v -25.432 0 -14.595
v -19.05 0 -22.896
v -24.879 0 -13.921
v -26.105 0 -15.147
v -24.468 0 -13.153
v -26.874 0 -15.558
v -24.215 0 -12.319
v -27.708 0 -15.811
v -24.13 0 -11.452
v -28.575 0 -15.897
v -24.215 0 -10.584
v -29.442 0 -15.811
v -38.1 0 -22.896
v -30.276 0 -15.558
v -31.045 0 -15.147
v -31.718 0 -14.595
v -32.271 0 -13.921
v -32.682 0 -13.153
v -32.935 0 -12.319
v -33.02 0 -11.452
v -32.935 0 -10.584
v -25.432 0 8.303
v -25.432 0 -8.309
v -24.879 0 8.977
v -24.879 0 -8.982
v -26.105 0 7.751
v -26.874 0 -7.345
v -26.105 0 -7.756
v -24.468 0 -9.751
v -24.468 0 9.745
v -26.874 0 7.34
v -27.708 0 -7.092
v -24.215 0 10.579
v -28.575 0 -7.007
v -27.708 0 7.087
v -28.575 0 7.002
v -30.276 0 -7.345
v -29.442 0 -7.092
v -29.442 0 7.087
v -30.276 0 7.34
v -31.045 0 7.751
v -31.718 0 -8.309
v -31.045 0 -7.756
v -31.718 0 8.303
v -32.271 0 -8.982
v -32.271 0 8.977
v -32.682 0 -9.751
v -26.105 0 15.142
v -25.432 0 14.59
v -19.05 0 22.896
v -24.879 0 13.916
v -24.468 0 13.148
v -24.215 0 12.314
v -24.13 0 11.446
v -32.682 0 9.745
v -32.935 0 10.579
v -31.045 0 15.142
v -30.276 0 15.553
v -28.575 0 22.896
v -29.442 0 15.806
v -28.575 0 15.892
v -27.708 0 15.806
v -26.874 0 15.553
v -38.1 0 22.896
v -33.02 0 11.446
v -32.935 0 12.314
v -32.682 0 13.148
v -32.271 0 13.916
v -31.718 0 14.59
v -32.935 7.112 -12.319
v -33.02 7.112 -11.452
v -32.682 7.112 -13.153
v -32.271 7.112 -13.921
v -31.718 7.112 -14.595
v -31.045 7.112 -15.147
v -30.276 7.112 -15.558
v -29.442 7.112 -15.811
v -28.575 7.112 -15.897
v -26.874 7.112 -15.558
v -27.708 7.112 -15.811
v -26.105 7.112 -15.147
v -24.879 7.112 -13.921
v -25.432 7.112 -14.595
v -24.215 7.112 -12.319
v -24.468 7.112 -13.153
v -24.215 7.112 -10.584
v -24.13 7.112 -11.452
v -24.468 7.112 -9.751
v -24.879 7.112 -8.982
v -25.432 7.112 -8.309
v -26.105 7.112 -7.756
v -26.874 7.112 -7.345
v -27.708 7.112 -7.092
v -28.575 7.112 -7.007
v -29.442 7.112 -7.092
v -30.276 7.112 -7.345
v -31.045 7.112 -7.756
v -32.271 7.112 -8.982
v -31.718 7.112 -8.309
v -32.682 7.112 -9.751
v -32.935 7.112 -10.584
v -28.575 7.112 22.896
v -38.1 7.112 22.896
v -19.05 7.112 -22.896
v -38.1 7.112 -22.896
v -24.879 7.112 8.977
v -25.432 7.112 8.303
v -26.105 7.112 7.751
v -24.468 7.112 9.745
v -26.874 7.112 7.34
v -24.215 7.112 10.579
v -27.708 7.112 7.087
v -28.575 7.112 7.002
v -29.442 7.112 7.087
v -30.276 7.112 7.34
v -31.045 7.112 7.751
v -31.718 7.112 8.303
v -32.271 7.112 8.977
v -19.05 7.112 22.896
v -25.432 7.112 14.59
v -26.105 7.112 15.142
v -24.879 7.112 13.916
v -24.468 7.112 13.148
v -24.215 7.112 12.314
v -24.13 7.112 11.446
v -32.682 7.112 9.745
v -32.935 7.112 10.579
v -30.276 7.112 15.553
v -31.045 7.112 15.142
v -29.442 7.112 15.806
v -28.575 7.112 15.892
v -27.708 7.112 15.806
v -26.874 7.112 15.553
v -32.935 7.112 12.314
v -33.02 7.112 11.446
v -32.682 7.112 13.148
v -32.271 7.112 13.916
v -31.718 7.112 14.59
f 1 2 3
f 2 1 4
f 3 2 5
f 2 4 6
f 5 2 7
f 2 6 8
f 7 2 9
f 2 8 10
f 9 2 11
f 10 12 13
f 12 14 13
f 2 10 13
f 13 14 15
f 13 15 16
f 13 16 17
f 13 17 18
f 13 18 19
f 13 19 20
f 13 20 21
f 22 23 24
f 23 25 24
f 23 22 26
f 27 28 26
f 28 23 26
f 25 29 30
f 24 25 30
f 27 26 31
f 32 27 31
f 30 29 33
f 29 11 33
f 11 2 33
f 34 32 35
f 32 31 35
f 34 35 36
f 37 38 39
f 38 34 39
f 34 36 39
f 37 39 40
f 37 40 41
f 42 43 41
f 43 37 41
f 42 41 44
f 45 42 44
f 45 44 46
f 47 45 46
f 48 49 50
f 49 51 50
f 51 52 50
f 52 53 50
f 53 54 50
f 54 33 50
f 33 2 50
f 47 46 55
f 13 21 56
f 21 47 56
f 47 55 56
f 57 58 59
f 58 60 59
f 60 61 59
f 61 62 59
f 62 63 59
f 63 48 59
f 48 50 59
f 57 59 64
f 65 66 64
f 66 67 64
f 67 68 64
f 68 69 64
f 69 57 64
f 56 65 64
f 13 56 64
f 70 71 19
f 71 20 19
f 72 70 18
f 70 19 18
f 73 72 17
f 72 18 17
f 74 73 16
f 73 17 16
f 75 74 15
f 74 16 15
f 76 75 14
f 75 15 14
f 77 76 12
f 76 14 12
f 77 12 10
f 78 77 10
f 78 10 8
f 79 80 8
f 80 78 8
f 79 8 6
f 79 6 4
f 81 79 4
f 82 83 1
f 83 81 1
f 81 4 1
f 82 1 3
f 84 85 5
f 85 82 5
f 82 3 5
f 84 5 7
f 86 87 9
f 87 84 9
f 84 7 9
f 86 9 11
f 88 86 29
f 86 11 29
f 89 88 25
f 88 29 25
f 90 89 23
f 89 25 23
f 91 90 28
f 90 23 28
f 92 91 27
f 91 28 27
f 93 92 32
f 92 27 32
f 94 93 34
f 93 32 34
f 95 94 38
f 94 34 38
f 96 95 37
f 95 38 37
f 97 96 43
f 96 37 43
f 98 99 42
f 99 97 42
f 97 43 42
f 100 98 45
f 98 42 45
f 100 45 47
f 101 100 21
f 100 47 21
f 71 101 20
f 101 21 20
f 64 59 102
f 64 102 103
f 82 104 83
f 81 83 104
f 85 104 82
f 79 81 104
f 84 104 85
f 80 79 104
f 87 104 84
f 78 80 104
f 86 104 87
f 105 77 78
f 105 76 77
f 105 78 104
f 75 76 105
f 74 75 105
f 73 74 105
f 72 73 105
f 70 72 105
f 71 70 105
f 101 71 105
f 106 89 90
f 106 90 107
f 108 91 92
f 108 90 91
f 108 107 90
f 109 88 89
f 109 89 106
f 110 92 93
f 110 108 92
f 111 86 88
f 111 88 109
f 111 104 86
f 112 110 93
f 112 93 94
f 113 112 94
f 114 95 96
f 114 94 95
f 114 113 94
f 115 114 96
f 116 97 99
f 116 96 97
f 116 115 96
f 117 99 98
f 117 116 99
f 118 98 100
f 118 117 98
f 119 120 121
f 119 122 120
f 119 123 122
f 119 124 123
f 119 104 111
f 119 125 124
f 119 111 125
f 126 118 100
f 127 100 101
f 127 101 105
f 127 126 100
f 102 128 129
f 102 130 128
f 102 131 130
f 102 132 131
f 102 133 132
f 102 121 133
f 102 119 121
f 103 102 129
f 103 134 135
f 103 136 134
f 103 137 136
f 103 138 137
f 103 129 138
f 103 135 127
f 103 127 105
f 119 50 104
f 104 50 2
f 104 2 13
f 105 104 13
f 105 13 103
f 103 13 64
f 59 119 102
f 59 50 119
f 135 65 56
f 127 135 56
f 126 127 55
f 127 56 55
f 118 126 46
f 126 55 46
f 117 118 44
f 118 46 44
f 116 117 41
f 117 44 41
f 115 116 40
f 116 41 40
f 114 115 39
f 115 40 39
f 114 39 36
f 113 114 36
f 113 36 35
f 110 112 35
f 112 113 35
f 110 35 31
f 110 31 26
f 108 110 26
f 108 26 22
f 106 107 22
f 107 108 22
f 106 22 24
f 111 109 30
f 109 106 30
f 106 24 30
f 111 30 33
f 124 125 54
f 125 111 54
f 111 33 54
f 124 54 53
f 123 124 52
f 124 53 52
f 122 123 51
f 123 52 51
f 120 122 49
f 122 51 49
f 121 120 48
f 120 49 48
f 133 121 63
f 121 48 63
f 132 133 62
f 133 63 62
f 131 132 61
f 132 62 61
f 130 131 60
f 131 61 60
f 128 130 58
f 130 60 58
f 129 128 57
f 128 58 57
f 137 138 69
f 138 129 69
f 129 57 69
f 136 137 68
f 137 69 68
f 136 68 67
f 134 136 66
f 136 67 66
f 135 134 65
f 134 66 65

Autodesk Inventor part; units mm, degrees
ref_plane "YZ Plane" through (0, 0, 0) normal (1, 0, 0) x (0, 1, 0)
ref_plane "XZ Plane" through (0, 0, 0) normal (0, 1, 0) x (-1, 0, 0)
ref_plane "XY Plane" through (0, 0, 0) normal (0, 0, 1) x (1, 0, 0)
sketch "Sketch1" plane through (0, 0, 0) normal (0, 1, 0) x (-1, 0, 0)
  line L0 (19.05, 22.8956) -> (38.1, 22.8956)
  line L1 (38.1, 22.8956) -> (19.05, 22.8956)
  line L2 (19.05, -22.8956) -> (38.1, -22.8956)
  line L3 (38.1, -22.8956) -> (38.1, 22.8956)
  line L4 (38.1, 22.8956) -> (19.05, 22.8956)
  line L5 (19.05, 22.8956) -> (19.05, -22.8956)
  line L6 (38.1, 22.8956) -> (28.575, 22.8956)
  circle A0 centre (28.575, 11.4465) radius 4.445
  circle A1 centre (28.575, -11.4516) radius 4.445
  dimension "d6" = 45.7911
  dimension "d7" = 19.05
  dimension "d8" = 19.05
  dimension "d9" = 9.525
  dimension "d13" = 8.89
extrude "Extrusion1" add sketch "Sketch1" along normal blind 7.112
properties part number "BracketOfTheBracket"
